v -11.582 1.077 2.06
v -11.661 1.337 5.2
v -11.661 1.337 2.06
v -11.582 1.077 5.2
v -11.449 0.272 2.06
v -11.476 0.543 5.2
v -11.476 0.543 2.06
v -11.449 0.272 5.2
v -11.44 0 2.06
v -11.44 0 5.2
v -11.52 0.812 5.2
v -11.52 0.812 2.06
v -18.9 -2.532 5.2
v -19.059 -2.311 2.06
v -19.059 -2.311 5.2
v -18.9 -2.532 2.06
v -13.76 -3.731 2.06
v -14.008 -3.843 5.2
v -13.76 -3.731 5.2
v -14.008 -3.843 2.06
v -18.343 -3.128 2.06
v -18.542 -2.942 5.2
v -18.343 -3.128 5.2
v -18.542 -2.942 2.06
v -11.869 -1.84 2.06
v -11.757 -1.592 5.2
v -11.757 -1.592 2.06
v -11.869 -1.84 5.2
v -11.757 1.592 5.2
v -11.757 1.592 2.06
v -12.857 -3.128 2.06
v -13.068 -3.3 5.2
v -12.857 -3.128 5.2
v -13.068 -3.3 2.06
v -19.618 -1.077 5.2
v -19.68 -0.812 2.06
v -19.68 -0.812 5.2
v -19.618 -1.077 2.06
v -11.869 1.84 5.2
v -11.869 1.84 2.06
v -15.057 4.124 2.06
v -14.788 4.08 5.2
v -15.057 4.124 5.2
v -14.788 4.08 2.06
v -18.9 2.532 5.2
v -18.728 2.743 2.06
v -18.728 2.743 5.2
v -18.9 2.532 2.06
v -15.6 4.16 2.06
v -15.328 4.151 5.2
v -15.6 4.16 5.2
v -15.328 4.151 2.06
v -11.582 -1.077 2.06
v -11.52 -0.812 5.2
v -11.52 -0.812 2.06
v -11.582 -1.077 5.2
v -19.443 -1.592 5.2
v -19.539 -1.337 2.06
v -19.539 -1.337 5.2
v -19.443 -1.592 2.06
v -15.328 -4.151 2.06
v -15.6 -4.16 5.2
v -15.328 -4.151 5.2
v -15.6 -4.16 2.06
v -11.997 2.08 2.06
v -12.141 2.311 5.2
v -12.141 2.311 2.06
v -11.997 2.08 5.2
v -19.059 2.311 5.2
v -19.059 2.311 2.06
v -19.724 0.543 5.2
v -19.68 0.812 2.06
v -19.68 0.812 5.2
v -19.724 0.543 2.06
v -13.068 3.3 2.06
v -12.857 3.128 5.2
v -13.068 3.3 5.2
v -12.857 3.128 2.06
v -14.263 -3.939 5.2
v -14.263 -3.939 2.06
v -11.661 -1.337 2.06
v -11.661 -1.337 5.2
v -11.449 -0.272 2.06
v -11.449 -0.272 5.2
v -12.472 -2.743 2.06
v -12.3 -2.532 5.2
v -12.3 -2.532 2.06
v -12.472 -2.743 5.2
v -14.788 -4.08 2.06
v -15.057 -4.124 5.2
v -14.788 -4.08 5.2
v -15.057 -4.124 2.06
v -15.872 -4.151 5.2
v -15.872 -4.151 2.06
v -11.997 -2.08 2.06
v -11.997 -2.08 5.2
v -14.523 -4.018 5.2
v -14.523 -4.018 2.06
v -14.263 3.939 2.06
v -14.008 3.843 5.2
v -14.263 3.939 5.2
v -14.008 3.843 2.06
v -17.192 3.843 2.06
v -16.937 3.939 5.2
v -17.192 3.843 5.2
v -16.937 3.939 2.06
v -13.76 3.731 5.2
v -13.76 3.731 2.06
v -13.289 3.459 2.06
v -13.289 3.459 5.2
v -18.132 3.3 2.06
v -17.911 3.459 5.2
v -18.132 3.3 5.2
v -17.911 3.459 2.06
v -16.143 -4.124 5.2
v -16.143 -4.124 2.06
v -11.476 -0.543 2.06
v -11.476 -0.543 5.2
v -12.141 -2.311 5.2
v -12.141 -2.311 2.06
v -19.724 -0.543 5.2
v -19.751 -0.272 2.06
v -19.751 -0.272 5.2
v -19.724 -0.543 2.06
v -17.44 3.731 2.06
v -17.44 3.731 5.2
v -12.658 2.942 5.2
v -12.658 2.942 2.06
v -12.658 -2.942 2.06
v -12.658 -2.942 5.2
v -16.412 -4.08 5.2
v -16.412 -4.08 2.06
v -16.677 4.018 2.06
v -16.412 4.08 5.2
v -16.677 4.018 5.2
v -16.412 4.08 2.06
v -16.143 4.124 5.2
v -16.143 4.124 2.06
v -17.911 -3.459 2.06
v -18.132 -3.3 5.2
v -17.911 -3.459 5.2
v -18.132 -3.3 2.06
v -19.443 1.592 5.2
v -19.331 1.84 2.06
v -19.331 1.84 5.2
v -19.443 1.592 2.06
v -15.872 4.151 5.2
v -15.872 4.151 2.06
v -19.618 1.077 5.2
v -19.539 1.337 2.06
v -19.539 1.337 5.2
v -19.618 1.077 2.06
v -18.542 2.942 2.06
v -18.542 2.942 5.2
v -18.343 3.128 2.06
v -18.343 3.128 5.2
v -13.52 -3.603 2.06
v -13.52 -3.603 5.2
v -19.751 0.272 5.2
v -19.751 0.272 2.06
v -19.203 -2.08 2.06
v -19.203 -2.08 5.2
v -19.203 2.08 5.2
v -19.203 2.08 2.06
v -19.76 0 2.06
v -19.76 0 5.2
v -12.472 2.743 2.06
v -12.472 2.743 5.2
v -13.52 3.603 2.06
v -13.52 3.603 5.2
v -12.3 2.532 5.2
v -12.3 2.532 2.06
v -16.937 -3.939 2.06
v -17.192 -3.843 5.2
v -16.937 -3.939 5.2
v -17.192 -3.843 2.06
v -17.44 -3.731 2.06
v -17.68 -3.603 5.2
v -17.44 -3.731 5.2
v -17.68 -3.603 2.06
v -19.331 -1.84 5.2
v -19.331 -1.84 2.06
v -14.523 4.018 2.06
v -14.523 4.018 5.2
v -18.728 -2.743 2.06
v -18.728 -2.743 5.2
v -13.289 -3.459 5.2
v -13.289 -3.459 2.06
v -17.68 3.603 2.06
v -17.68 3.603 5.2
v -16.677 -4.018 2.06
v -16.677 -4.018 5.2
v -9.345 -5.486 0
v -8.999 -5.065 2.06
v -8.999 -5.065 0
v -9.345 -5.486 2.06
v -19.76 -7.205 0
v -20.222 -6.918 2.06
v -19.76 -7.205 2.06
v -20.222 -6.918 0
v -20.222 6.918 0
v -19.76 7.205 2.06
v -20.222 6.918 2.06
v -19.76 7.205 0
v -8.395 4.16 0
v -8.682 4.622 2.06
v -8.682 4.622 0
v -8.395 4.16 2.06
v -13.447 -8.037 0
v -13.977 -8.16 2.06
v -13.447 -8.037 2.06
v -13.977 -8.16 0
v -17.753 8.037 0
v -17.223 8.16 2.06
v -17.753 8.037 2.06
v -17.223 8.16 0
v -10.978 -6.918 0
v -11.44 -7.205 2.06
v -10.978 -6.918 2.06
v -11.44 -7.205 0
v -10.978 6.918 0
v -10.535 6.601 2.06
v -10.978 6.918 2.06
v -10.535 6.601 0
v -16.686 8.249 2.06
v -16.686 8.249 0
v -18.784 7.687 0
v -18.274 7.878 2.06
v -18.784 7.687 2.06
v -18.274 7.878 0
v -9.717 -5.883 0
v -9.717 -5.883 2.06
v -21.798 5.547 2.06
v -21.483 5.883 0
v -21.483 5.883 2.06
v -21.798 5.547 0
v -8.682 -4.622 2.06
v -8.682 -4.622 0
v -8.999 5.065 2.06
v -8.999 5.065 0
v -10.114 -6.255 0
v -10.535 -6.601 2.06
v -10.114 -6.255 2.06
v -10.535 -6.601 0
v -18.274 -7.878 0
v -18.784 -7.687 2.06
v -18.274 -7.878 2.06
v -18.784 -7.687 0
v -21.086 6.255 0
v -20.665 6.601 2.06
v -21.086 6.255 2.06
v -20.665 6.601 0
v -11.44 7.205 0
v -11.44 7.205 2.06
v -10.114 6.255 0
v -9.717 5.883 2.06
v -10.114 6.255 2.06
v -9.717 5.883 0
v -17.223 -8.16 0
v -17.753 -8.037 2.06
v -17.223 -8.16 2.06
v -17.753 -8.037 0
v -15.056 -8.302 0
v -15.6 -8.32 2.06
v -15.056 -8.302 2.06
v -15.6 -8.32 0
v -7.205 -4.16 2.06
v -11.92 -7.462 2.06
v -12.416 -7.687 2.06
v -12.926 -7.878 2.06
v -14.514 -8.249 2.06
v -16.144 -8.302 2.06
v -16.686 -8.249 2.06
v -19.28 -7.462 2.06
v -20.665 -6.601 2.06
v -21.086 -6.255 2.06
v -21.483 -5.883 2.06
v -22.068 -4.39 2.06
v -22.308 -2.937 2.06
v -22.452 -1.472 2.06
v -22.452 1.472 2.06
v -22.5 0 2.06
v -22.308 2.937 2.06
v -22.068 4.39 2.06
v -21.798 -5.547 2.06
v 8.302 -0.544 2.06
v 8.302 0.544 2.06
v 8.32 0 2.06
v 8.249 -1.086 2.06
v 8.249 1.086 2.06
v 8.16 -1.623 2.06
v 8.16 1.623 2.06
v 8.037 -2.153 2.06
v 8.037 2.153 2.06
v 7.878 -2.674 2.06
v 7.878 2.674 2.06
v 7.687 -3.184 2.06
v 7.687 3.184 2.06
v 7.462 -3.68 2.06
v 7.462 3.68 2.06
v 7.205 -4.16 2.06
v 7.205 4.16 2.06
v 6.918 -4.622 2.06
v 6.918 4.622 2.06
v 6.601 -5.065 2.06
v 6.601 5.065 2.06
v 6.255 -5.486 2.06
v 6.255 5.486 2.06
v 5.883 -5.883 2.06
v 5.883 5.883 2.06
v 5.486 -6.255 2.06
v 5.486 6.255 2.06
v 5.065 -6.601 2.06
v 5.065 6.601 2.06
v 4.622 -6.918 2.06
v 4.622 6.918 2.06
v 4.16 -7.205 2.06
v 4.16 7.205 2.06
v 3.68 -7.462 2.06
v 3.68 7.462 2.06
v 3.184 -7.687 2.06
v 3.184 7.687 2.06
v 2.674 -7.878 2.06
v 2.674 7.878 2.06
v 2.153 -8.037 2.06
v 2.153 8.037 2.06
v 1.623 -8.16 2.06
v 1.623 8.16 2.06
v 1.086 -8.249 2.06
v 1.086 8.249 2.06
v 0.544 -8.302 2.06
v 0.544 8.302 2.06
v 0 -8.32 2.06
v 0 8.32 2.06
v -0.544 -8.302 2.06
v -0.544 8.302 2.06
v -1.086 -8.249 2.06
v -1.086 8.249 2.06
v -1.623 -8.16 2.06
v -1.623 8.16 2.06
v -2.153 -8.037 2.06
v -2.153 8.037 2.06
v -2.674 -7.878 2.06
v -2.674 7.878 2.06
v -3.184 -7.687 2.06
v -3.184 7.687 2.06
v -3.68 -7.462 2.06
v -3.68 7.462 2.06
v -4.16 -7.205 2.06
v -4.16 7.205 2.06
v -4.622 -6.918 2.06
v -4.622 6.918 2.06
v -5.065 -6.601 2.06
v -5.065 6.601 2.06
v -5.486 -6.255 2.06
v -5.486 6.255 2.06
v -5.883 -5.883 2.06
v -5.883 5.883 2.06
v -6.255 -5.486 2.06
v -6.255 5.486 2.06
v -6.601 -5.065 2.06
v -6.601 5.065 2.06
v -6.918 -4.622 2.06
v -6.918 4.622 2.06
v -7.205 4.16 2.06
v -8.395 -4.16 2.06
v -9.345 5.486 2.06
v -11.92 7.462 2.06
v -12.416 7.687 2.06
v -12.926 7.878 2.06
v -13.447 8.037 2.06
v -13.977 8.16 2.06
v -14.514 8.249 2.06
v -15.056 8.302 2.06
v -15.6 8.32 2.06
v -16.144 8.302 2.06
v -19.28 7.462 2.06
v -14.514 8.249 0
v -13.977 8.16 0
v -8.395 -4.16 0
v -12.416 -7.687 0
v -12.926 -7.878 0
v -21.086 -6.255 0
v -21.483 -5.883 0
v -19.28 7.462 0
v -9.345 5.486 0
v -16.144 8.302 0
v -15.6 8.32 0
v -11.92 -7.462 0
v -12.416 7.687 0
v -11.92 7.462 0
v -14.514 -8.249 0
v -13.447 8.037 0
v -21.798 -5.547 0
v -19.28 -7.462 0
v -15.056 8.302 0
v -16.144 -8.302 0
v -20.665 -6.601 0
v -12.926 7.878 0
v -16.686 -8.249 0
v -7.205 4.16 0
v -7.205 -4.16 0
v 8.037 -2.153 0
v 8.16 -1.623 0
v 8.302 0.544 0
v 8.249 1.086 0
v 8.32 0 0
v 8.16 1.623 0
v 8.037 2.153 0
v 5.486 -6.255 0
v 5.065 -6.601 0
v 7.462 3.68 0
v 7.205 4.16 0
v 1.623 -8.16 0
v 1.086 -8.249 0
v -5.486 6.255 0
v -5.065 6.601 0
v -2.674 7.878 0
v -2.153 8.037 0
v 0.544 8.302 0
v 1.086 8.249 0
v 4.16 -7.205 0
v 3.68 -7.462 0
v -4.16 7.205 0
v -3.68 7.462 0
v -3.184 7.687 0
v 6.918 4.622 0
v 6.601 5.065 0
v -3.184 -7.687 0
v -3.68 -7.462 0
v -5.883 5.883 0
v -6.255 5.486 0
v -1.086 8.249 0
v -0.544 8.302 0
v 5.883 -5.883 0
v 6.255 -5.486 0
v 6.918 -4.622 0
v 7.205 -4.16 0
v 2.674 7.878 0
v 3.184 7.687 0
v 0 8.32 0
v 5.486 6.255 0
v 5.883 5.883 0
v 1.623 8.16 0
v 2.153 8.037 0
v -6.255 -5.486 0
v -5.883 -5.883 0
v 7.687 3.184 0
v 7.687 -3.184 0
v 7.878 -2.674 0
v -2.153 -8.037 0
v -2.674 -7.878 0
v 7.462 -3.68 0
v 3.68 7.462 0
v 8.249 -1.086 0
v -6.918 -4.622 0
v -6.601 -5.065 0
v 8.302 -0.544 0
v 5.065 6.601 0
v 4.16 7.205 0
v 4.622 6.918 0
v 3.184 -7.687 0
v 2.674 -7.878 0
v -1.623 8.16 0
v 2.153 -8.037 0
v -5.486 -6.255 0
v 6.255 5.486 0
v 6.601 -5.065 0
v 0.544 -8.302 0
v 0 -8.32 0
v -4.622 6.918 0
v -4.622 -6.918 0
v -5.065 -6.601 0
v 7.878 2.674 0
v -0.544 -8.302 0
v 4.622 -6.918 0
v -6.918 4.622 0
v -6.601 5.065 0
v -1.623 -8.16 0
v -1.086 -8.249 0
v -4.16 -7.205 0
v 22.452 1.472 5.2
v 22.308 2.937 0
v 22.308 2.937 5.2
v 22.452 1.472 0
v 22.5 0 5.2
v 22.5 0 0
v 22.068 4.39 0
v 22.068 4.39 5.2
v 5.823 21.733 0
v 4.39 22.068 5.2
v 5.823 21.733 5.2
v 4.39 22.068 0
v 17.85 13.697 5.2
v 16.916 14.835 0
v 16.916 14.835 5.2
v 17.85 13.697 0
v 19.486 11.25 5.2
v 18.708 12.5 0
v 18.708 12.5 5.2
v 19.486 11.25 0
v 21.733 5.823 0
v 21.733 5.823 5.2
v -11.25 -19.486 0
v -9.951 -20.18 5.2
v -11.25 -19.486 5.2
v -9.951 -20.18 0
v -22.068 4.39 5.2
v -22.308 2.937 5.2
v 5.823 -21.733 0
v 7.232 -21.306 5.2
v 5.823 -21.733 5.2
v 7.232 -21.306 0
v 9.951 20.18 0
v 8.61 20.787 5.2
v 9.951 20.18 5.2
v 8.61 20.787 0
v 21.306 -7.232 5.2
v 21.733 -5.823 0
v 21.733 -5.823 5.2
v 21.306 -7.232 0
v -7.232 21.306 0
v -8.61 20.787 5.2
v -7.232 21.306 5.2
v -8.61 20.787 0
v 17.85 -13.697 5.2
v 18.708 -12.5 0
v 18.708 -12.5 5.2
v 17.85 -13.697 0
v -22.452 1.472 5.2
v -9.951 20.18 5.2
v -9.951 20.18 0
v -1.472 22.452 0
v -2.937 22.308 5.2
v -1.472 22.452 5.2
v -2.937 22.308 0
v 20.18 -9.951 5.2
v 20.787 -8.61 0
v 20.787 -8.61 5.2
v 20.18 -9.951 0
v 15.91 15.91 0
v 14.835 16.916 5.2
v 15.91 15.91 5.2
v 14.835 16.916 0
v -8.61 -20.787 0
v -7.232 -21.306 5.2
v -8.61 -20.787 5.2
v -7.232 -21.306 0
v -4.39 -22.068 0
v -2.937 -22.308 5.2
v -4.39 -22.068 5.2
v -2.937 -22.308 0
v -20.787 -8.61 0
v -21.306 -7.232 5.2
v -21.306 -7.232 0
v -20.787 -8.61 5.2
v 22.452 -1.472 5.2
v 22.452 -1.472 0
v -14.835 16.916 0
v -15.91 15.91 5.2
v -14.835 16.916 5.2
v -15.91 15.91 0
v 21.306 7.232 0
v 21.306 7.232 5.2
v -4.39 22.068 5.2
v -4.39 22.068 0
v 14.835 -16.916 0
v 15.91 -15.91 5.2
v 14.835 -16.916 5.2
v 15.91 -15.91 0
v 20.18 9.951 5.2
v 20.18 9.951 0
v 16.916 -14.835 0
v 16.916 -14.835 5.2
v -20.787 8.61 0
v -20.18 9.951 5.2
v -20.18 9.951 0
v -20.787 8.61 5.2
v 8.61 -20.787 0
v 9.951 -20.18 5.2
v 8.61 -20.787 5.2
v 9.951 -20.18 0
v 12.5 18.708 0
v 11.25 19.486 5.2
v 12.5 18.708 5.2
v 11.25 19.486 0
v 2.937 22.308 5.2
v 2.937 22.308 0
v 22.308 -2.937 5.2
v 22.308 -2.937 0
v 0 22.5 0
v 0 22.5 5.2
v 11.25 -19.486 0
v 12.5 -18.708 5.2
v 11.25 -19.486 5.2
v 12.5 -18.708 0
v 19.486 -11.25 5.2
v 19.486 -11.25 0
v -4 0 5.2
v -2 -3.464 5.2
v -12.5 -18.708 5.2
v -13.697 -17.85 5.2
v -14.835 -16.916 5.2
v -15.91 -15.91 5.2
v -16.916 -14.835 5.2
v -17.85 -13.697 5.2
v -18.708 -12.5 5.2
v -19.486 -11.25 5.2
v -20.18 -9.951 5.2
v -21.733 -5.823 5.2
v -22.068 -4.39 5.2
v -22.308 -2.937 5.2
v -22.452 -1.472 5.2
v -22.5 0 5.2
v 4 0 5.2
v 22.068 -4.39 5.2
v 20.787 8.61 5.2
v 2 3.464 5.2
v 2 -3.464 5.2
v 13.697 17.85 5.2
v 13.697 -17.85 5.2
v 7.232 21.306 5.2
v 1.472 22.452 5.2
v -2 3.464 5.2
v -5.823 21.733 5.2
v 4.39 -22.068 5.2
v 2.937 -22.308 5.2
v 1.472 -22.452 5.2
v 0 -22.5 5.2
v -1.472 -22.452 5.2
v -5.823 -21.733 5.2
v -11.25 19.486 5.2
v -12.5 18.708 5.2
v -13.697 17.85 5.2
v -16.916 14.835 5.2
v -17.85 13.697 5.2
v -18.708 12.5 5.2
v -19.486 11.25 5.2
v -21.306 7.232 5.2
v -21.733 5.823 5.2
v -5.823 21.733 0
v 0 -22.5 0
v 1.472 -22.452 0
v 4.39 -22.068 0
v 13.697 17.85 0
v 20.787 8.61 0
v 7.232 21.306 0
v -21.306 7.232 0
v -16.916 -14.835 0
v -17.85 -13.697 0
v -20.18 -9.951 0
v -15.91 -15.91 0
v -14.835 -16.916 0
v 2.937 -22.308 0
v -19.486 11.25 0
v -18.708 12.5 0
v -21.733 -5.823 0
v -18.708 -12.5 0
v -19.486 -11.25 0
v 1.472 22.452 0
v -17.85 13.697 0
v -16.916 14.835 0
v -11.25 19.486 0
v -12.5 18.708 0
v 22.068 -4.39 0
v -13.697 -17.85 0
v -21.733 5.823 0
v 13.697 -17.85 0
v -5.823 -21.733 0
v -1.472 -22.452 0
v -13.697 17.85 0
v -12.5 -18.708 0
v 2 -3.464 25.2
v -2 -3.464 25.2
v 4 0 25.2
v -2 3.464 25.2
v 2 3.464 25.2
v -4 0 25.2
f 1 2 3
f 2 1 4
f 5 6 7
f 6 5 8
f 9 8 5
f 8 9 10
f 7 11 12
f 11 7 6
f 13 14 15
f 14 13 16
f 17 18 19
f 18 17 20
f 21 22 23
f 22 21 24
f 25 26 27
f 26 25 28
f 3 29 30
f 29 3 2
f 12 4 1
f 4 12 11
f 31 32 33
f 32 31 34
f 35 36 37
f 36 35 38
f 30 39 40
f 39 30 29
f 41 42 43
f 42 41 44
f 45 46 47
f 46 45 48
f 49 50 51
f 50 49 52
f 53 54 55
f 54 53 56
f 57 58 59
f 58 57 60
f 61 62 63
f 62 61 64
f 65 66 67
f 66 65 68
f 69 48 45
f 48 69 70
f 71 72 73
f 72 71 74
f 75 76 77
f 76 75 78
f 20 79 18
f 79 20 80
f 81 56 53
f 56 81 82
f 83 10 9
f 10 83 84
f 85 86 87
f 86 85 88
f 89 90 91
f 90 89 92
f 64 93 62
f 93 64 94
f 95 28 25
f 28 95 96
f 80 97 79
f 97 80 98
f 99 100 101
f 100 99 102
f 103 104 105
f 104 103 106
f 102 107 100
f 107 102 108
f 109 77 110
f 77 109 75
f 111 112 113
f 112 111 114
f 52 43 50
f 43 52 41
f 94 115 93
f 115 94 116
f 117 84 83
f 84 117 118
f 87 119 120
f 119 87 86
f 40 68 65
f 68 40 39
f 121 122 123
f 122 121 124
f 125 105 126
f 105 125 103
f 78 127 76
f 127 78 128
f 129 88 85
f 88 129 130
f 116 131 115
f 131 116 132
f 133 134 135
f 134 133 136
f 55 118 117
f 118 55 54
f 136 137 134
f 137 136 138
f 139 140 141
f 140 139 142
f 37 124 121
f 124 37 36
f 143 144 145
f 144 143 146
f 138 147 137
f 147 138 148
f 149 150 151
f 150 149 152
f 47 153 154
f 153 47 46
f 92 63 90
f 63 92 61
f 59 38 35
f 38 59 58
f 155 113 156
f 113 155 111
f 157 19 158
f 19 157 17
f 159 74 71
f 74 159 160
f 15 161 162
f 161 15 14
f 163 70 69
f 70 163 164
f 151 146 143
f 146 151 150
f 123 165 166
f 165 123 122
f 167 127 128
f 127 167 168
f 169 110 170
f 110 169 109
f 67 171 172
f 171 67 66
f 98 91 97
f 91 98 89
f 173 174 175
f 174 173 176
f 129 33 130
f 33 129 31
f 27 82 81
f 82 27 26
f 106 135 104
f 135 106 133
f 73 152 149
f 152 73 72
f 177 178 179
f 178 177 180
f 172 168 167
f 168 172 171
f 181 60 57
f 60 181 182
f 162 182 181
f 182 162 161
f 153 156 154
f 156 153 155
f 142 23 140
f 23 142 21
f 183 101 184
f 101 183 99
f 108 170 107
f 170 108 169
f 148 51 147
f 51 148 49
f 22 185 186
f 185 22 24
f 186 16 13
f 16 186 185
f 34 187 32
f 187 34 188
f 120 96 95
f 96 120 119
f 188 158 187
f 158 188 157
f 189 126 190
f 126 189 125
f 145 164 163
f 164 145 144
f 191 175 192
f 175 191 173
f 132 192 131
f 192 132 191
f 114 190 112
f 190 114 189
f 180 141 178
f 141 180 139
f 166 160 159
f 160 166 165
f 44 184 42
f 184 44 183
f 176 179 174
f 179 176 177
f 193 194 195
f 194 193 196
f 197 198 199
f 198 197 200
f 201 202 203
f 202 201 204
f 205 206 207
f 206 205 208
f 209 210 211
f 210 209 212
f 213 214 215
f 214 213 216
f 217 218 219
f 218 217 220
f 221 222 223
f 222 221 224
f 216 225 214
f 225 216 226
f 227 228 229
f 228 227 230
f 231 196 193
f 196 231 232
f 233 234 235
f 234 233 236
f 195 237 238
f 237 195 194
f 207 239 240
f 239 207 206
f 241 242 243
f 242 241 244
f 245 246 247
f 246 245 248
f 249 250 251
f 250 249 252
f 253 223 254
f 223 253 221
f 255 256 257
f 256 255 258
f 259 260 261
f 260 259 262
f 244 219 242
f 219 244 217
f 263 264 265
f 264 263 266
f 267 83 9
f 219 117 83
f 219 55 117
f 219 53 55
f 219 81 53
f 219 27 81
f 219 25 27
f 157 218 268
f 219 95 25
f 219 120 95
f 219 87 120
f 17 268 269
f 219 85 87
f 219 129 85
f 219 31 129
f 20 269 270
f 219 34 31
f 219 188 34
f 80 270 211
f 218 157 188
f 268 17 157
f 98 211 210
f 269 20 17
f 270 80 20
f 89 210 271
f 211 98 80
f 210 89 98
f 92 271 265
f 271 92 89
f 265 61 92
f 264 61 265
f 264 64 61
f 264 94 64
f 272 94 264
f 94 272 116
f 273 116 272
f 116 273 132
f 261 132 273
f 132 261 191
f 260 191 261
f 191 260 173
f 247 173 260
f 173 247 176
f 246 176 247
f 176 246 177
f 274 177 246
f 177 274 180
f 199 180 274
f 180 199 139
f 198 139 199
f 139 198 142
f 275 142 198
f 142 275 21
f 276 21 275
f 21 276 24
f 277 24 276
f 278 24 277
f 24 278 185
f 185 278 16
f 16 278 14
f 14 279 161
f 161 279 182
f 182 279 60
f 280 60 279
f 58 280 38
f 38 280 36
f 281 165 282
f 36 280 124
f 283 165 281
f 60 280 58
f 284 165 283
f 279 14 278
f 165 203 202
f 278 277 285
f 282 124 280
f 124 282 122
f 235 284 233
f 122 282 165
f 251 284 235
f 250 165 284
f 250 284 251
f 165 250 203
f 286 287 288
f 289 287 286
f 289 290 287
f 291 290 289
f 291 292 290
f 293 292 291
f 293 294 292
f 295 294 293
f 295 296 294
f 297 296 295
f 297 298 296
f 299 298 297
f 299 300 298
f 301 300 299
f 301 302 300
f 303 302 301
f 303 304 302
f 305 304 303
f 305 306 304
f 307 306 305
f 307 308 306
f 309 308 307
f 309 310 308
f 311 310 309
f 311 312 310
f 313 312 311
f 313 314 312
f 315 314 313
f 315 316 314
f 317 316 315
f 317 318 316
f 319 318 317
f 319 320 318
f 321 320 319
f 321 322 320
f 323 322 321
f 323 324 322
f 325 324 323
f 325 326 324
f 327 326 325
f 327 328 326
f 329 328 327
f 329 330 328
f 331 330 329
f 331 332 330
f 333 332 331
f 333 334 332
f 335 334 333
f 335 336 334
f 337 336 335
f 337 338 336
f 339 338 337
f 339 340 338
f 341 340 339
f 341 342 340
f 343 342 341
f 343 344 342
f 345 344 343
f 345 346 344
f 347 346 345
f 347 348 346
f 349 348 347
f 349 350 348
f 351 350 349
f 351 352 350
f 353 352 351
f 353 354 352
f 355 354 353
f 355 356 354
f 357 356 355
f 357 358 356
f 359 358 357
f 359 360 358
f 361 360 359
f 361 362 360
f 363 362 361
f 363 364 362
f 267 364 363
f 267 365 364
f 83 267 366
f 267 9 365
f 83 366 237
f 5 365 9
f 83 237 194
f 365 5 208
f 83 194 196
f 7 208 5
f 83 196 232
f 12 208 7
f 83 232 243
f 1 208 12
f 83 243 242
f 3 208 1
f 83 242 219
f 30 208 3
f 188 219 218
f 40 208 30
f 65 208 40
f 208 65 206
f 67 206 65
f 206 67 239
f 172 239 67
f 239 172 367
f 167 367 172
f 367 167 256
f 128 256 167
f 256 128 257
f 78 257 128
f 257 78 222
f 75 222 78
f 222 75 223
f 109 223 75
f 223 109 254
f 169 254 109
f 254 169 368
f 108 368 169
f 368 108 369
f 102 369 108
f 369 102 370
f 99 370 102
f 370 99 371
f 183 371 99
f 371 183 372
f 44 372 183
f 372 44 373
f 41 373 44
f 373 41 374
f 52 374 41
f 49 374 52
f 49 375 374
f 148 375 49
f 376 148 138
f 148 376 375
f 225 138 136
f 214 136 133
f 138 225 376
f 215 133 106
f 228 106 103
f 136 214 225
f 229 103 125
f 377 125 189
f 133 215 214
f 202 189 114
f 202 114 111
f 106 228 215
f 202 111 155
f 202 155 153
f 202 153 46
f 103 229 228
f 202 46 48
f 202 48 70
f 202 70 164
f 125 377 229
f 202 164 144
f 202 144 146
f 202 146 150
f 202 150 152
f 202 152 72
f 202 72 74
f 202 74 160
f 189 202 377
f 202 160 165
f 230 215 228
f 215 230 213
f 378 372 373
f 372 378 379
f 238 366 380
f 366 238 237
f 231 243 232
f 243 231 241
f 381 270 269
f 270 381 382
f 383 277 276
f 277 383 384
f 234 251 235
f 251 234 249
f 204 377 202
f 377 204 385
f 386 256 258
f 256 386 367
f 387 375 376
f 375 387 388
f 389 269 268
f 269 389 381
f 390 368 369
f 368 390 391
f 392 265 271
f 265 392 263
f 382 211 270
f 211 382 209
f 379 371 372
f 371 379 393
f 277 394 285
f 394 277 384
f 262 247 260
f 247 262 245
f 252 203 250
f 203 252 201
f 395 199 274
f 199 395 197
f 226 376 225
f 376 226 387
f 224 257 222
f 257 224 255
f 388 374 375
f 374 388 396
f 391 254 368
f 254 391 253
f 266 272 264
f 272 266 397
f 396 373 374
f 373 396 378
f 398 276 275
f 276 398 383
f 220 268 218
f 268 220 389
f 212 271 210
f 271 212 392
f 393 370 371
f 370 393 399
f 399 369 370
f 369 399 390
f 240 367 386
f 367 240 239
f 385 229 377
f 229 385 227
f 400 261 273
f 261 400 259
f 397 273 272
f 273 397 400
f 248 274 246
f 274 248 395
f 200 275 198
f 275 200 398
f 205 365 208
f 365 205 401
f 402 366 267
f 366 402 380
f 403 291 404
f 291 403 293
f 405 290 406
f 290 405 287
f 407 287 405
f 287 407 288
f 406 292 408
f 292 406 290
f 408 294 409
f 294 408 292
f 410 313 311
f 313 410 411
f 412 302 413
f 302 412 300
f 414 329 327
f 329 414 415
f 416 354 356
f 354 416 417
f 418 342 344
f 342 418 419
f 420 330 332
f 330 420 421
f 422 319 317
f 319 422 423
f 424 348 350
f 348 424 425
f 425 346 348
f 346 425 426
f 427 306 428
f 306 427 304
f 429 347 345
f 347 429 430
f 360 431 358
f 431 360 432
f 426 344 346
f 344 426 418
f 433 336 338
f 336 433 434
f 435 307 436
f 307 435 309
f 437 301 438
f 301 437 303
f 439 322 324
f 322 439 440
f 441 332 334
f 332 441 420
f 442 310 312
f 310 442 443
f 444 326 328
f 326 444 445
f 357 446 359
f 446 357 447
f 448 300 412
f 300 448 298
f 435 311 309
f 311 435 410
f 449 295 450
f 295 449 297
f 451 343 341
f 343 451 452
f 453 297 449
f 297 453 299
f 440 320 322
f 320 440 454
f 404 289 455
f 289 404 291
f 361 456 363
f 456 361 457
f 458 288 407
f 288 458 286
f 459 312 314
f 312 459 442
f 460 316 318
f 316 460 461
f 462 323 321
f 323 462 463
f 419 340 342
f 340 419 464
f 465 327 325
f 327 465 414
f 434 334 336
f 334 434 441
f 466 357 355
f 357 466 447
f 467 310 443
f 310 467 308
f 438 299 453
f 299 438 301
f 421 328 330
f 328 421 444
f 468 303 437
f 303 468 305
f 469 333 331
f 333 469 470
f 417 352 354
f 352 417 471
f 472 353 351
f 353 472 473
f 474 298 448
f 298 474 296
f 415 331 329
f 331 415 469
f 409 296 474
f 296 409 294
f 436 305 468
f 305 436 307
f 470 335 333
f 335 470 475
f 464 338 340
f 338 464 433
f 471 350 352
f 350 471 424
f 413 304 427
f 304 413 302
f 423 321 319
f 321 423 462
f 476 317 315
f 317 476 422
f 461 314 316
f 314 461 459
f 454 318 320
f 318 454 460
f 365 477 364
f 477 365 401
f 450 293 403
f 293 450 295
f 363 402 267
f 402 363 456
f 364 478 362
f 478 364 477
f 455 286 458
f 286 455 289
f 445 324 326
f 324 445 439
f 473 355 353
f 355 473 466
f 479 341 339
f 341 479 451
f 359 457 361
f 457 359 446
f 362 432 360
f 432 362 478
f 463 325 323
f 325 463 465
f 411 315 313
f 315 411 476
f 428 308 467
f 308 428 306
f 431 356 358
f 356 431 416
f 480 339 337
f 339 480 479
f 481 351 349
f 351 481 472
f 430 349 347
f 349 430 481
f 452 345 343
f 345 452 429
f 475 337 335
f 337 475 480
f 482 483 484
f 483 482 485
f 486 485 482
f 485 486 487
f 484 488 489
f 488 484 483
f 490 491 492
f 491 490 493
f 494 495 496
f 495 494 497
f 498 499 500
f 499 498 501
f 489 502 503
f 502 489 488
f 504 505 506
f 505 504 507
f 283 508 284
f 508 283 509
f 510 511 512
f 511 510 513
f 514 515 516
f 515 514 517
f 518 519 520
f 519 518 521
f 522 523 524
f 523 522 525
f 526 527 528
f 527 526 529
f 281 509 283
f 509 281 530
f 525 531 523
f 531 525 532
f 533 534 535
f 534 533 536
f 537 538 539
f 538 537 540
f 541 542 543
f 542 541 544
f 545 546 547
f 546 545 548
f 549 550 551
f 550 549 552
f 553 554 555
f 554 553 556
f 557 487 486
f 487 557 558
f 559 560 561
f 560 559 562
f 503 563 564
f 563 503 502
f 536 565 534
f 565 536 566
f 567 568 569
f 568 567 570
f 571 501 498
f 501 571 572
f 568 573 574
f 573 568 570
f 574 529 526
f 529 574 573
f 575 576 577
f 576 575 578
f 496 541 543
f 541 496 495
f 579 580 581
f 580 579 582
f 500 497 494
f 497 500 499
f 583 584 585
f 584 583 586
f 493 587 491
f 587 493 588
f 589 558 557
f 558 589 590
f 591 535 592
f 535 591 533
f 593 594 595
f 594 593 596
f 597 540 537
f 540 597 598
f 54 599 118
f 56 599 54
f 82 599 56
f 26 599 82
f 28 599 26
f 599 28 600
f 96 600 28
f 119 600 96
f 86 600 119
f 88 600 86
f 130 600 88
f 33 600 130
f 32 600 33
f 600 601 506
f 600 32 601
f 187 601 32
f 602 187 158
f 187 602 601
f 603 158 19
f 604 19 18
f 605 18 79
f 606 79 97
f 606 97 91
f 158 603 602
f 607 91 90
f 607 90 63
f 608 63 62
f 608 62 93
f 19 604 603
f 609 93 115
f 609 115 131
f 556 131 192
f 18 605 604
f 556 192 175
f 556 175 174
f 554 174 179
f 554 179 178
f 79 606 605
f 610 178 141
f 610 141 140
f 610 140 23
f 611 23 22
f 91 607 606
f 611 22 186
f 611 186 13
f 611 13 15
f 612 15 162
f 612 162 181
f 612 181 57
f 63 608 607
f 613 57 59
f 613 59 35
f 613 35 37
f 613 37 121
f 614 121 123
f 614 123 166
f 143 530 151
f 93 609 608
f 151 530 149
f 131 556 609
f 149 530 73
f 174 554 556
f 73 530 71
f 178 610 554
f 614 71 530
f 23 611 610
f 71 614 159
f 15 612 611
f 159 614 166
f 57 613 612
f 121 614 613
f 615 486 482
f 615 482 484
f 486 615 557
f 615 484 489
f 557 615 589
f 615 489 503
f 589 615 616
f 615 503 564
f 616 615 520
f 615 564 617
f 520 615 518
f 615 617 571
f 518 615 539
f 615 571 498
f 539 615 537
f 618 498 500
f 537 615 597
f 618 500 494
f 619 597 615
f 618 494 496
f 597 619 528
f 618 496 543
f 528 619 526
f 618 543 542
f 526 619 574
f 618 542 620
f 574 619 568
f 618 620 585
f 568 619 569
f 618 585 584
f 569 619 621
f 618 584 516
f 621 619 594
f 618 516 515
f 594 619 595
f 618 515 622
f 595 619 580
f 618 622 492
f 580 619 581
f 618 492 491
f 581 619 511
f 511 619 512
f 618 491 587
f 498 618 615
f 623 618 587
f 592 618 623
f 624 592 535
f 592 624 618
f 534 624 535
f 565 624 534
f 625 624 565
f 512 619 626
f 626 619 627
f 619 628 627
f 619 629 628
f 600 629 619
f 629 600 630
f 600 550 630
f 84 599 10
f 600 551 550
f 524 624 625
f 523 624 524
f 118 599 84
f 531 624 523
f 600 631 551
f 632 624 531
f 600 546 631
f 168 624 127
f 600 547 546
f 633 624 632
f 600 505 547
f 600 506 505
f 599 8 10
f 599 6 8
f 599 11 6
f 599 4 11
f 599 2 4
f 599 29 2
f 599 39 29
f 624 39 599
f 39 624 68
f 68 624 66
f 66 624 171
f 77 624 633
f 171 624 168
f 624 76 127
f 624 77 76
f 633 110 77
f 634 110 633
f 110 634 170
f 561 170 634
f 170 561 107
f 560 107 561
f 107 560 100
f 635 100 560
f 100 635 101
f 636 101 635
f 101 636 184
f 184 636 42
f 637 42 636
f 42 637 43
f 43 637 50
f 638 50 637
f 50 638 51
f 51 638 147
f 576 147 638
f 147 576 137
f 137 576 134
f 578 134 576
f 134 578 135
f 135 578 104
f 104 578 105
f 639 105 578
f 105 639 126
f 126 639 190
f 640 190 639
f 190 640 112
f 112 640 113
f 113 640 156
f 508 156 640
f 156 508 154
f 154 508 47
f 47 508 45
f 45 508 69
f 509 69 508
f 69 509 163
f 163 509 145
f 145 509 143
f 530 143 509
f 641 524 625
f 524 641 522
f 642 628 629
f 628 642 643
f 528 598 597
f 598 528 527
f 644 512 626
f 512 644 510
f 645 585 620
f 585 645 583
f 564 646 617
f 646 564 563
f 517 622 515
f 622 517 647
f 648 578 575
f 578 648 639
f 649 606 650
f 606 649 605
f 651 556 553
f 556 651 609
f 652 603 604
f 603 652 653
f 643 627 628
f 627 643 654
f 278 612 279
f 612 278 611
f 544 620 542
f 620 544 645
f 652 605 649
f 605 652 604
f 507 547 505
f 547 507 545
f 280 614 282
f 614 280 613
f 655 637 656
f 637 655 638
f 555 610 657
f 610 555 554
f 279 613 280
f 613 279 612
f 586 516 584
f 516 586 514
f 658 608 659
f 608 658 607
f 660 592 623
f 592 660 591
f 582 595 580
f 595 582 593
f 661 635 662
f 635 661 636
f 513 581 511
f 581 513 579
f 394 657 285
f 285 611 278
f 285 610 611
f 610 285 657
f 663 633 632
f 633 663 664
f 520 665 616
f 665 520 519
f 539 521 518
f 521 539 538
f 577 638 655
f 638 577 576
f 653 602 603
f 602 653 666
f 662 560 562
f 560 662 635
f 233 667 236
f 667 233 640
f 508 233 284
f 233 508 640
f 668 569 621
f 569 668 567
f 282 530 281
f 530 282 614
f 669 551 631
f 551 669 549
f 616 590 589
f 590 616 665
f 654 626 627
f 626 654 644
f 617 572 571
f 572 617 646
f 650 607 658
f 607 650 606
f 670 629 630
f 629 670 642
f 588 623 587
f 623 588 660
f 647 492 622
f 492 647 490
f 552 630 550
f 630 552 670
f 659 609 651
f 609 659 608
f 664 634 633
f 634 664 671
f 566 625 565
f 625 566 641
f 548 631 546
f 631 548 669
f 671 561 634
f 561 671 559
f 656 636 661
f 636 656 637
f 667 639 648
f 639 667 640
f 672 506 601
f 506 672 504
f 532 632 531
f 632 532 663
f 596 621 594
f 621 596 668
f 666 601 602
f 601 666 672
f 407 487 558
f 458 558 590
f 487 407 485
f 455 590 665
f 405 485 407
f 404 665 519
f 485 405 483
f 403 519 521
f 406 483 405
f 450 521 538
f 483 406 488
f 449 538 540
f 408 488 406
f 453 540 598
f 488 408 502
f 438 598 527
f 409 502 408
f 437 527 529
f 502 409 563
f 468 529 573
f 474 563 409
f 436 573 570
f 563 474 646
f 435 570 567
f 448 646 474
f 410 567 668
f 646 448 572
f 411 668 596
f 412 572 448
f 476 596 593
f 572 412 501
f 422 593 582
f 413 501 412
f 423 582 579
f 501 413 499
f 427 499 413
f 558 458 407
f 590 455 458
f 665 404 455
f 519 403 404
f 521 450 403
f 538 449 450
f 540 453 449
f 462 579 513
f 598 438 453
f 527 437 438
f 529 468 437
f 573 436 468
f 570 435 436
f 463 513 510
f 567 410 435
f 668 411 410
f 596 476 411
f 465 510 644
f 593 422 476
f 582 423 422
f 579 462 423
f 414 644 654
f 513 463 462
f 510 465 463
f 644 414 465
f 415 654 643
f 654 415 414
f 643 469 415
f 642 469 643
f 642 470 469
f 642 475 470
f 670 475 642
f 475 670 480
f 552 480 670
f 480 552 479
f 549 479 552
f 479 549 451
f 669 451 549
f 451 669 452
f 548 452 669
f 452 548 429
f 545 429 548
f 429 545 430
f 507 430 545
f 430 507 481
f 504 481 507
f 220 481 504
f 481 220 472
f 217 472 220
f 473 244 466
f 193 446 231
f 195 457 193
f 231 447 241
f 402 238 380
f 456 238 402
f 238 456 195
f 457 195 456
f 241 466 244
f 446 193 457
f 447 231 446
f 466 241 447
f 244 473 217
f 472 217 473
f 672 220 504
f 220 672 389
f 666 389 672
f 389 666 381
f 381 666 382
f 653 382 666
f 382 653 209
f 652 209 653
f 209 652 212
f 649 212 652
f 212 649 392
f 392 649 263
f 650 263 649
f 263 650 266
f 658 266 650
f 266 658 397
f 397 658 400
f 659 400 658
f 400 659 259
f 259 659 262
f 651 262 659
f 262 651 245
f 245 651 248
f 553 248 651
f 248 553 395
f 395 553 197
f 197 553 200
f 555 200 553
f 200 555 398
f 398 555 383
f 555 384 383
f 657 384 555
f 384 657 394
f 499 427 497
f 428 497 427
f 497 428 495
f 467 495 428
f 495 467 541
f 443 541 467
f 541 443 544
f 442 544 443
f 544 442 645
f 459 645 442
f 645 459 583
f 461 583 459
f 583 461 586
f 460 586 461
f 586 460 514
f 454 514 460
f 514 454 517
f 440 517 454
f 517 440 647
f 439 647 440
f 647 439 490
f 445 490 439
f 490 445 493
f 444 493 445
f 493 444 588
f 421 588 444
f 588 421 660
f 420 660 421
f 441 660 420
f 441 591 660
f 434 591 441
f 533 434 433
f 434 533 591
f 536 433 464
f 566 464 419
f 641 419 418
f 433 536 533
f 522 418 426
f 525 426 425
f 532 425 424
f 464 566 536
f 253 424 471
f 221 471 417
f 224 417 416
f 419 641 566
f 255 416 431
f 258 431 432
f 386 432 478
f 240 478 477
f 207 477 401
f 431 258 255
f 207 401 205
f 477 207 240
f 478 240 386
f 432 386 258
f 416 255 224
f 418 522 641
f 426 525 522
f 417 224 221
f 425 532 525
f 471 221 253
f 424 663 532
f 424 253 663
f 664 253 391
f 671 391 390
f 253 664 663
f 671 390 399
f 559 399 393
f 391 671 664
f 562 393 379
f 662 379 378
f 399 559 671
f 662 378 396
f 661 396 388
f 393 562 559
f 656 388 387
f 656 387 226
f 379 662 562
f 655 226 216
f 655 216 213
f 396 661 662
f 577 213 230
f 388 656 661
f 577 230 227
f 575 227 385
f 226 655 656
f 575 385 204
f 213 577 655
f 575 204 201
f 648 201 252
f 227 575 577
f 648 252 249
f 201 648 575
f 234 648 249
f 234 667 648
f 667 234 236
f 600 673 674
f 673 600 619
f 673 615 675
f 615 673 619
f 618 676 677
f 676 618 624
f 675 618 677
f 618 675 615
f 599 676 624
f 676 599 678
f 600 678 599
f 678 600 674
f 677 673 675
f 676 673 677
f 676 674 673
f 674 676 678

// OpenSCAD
// file: defs.scad
JointVertSpace=30;
LayerUnit=100;
SpacedLayer=LayerUnit+JointVertSpace;
JointR = 400;
ShaftR = 200;
ShaftHole=230;
ShaftTight=205;
HexTight=210;
MagicMult = 50;

// Spine Horizontal
MagicA = MagicMult * 38;
// Spine Verticial
MagicL = MagicMult * 7.8;

// Leg Triangle
MagicG = MagicMult * 36.7; // a
MagicH = MagicMult * 65.7; // c
MagicI = MagicMult * 49;   // b

// Driver Triangle
MagicB = MagicMult * 41.5;
MagicD = MagicMult * 40.1;
MagicE = MagicMult * 55.8;

// Front Strut
MagicC = MagicMult * 39.3;
FsLen = MagicC;

// Back Strut
MagicF = MagicMult * 39.4;
BsLen = MagicF;

// Lower Driver Strut
MagicK = MagicMult * 61.9;

// Upper Driver Strut
MagicJ = MagicMult * 50;

// Cam radius
MagicM = MagicMult * 15;
// main file
include <defs.scad>
ViewScale=[.02,.02,.02];
//ViewScale=[1,1,1];
spineLength = sqrt(pow(MagicA, 2) + pow(MagicL,2));



module cam()
{
    shaftHeight = SpacedLayer * 5;
    // Cam
//    translate([0, 0, 0]) { difference() {
        union() {
            // shaft
            translate([0, 0, 0]) cylinder(shaftHeight, r=ShaftR, $fn=96);
            translate([0, 0, 0]) cylinder(LayerUnit, r=JointR, $fn=96);
            // strut
            translate([0, -200, 0]) cube([MagicM, 400, LayerUnit]);
            // central shaft
            translate([MagicM,0,0]) cylinder(LayerUnit, r=JointR, $fn=96);
        }
        // hex cutout
//        translate([MagicM,0,-10]) cylinder(220, r=ShaftTight, $fn=96);
//        }
//    }
}


// Outer joint plus half the rod
module wheel() {
    difference()
    {
        cylinder(SpacedLayer * 2, r=MagicM*1.5, $fn=96);
        translate([0, 0, -1]) scale([1.04, 1.04, 1.04]) translate([-MagicM, 0, 0]) cam();
    }
}

scale(ViewScale) {
    wheel();

    // Drill driver
    translate([0, 0, SpacedLayer *2]) cylinder(1000, r=ShaftR, $fn=6);
}
